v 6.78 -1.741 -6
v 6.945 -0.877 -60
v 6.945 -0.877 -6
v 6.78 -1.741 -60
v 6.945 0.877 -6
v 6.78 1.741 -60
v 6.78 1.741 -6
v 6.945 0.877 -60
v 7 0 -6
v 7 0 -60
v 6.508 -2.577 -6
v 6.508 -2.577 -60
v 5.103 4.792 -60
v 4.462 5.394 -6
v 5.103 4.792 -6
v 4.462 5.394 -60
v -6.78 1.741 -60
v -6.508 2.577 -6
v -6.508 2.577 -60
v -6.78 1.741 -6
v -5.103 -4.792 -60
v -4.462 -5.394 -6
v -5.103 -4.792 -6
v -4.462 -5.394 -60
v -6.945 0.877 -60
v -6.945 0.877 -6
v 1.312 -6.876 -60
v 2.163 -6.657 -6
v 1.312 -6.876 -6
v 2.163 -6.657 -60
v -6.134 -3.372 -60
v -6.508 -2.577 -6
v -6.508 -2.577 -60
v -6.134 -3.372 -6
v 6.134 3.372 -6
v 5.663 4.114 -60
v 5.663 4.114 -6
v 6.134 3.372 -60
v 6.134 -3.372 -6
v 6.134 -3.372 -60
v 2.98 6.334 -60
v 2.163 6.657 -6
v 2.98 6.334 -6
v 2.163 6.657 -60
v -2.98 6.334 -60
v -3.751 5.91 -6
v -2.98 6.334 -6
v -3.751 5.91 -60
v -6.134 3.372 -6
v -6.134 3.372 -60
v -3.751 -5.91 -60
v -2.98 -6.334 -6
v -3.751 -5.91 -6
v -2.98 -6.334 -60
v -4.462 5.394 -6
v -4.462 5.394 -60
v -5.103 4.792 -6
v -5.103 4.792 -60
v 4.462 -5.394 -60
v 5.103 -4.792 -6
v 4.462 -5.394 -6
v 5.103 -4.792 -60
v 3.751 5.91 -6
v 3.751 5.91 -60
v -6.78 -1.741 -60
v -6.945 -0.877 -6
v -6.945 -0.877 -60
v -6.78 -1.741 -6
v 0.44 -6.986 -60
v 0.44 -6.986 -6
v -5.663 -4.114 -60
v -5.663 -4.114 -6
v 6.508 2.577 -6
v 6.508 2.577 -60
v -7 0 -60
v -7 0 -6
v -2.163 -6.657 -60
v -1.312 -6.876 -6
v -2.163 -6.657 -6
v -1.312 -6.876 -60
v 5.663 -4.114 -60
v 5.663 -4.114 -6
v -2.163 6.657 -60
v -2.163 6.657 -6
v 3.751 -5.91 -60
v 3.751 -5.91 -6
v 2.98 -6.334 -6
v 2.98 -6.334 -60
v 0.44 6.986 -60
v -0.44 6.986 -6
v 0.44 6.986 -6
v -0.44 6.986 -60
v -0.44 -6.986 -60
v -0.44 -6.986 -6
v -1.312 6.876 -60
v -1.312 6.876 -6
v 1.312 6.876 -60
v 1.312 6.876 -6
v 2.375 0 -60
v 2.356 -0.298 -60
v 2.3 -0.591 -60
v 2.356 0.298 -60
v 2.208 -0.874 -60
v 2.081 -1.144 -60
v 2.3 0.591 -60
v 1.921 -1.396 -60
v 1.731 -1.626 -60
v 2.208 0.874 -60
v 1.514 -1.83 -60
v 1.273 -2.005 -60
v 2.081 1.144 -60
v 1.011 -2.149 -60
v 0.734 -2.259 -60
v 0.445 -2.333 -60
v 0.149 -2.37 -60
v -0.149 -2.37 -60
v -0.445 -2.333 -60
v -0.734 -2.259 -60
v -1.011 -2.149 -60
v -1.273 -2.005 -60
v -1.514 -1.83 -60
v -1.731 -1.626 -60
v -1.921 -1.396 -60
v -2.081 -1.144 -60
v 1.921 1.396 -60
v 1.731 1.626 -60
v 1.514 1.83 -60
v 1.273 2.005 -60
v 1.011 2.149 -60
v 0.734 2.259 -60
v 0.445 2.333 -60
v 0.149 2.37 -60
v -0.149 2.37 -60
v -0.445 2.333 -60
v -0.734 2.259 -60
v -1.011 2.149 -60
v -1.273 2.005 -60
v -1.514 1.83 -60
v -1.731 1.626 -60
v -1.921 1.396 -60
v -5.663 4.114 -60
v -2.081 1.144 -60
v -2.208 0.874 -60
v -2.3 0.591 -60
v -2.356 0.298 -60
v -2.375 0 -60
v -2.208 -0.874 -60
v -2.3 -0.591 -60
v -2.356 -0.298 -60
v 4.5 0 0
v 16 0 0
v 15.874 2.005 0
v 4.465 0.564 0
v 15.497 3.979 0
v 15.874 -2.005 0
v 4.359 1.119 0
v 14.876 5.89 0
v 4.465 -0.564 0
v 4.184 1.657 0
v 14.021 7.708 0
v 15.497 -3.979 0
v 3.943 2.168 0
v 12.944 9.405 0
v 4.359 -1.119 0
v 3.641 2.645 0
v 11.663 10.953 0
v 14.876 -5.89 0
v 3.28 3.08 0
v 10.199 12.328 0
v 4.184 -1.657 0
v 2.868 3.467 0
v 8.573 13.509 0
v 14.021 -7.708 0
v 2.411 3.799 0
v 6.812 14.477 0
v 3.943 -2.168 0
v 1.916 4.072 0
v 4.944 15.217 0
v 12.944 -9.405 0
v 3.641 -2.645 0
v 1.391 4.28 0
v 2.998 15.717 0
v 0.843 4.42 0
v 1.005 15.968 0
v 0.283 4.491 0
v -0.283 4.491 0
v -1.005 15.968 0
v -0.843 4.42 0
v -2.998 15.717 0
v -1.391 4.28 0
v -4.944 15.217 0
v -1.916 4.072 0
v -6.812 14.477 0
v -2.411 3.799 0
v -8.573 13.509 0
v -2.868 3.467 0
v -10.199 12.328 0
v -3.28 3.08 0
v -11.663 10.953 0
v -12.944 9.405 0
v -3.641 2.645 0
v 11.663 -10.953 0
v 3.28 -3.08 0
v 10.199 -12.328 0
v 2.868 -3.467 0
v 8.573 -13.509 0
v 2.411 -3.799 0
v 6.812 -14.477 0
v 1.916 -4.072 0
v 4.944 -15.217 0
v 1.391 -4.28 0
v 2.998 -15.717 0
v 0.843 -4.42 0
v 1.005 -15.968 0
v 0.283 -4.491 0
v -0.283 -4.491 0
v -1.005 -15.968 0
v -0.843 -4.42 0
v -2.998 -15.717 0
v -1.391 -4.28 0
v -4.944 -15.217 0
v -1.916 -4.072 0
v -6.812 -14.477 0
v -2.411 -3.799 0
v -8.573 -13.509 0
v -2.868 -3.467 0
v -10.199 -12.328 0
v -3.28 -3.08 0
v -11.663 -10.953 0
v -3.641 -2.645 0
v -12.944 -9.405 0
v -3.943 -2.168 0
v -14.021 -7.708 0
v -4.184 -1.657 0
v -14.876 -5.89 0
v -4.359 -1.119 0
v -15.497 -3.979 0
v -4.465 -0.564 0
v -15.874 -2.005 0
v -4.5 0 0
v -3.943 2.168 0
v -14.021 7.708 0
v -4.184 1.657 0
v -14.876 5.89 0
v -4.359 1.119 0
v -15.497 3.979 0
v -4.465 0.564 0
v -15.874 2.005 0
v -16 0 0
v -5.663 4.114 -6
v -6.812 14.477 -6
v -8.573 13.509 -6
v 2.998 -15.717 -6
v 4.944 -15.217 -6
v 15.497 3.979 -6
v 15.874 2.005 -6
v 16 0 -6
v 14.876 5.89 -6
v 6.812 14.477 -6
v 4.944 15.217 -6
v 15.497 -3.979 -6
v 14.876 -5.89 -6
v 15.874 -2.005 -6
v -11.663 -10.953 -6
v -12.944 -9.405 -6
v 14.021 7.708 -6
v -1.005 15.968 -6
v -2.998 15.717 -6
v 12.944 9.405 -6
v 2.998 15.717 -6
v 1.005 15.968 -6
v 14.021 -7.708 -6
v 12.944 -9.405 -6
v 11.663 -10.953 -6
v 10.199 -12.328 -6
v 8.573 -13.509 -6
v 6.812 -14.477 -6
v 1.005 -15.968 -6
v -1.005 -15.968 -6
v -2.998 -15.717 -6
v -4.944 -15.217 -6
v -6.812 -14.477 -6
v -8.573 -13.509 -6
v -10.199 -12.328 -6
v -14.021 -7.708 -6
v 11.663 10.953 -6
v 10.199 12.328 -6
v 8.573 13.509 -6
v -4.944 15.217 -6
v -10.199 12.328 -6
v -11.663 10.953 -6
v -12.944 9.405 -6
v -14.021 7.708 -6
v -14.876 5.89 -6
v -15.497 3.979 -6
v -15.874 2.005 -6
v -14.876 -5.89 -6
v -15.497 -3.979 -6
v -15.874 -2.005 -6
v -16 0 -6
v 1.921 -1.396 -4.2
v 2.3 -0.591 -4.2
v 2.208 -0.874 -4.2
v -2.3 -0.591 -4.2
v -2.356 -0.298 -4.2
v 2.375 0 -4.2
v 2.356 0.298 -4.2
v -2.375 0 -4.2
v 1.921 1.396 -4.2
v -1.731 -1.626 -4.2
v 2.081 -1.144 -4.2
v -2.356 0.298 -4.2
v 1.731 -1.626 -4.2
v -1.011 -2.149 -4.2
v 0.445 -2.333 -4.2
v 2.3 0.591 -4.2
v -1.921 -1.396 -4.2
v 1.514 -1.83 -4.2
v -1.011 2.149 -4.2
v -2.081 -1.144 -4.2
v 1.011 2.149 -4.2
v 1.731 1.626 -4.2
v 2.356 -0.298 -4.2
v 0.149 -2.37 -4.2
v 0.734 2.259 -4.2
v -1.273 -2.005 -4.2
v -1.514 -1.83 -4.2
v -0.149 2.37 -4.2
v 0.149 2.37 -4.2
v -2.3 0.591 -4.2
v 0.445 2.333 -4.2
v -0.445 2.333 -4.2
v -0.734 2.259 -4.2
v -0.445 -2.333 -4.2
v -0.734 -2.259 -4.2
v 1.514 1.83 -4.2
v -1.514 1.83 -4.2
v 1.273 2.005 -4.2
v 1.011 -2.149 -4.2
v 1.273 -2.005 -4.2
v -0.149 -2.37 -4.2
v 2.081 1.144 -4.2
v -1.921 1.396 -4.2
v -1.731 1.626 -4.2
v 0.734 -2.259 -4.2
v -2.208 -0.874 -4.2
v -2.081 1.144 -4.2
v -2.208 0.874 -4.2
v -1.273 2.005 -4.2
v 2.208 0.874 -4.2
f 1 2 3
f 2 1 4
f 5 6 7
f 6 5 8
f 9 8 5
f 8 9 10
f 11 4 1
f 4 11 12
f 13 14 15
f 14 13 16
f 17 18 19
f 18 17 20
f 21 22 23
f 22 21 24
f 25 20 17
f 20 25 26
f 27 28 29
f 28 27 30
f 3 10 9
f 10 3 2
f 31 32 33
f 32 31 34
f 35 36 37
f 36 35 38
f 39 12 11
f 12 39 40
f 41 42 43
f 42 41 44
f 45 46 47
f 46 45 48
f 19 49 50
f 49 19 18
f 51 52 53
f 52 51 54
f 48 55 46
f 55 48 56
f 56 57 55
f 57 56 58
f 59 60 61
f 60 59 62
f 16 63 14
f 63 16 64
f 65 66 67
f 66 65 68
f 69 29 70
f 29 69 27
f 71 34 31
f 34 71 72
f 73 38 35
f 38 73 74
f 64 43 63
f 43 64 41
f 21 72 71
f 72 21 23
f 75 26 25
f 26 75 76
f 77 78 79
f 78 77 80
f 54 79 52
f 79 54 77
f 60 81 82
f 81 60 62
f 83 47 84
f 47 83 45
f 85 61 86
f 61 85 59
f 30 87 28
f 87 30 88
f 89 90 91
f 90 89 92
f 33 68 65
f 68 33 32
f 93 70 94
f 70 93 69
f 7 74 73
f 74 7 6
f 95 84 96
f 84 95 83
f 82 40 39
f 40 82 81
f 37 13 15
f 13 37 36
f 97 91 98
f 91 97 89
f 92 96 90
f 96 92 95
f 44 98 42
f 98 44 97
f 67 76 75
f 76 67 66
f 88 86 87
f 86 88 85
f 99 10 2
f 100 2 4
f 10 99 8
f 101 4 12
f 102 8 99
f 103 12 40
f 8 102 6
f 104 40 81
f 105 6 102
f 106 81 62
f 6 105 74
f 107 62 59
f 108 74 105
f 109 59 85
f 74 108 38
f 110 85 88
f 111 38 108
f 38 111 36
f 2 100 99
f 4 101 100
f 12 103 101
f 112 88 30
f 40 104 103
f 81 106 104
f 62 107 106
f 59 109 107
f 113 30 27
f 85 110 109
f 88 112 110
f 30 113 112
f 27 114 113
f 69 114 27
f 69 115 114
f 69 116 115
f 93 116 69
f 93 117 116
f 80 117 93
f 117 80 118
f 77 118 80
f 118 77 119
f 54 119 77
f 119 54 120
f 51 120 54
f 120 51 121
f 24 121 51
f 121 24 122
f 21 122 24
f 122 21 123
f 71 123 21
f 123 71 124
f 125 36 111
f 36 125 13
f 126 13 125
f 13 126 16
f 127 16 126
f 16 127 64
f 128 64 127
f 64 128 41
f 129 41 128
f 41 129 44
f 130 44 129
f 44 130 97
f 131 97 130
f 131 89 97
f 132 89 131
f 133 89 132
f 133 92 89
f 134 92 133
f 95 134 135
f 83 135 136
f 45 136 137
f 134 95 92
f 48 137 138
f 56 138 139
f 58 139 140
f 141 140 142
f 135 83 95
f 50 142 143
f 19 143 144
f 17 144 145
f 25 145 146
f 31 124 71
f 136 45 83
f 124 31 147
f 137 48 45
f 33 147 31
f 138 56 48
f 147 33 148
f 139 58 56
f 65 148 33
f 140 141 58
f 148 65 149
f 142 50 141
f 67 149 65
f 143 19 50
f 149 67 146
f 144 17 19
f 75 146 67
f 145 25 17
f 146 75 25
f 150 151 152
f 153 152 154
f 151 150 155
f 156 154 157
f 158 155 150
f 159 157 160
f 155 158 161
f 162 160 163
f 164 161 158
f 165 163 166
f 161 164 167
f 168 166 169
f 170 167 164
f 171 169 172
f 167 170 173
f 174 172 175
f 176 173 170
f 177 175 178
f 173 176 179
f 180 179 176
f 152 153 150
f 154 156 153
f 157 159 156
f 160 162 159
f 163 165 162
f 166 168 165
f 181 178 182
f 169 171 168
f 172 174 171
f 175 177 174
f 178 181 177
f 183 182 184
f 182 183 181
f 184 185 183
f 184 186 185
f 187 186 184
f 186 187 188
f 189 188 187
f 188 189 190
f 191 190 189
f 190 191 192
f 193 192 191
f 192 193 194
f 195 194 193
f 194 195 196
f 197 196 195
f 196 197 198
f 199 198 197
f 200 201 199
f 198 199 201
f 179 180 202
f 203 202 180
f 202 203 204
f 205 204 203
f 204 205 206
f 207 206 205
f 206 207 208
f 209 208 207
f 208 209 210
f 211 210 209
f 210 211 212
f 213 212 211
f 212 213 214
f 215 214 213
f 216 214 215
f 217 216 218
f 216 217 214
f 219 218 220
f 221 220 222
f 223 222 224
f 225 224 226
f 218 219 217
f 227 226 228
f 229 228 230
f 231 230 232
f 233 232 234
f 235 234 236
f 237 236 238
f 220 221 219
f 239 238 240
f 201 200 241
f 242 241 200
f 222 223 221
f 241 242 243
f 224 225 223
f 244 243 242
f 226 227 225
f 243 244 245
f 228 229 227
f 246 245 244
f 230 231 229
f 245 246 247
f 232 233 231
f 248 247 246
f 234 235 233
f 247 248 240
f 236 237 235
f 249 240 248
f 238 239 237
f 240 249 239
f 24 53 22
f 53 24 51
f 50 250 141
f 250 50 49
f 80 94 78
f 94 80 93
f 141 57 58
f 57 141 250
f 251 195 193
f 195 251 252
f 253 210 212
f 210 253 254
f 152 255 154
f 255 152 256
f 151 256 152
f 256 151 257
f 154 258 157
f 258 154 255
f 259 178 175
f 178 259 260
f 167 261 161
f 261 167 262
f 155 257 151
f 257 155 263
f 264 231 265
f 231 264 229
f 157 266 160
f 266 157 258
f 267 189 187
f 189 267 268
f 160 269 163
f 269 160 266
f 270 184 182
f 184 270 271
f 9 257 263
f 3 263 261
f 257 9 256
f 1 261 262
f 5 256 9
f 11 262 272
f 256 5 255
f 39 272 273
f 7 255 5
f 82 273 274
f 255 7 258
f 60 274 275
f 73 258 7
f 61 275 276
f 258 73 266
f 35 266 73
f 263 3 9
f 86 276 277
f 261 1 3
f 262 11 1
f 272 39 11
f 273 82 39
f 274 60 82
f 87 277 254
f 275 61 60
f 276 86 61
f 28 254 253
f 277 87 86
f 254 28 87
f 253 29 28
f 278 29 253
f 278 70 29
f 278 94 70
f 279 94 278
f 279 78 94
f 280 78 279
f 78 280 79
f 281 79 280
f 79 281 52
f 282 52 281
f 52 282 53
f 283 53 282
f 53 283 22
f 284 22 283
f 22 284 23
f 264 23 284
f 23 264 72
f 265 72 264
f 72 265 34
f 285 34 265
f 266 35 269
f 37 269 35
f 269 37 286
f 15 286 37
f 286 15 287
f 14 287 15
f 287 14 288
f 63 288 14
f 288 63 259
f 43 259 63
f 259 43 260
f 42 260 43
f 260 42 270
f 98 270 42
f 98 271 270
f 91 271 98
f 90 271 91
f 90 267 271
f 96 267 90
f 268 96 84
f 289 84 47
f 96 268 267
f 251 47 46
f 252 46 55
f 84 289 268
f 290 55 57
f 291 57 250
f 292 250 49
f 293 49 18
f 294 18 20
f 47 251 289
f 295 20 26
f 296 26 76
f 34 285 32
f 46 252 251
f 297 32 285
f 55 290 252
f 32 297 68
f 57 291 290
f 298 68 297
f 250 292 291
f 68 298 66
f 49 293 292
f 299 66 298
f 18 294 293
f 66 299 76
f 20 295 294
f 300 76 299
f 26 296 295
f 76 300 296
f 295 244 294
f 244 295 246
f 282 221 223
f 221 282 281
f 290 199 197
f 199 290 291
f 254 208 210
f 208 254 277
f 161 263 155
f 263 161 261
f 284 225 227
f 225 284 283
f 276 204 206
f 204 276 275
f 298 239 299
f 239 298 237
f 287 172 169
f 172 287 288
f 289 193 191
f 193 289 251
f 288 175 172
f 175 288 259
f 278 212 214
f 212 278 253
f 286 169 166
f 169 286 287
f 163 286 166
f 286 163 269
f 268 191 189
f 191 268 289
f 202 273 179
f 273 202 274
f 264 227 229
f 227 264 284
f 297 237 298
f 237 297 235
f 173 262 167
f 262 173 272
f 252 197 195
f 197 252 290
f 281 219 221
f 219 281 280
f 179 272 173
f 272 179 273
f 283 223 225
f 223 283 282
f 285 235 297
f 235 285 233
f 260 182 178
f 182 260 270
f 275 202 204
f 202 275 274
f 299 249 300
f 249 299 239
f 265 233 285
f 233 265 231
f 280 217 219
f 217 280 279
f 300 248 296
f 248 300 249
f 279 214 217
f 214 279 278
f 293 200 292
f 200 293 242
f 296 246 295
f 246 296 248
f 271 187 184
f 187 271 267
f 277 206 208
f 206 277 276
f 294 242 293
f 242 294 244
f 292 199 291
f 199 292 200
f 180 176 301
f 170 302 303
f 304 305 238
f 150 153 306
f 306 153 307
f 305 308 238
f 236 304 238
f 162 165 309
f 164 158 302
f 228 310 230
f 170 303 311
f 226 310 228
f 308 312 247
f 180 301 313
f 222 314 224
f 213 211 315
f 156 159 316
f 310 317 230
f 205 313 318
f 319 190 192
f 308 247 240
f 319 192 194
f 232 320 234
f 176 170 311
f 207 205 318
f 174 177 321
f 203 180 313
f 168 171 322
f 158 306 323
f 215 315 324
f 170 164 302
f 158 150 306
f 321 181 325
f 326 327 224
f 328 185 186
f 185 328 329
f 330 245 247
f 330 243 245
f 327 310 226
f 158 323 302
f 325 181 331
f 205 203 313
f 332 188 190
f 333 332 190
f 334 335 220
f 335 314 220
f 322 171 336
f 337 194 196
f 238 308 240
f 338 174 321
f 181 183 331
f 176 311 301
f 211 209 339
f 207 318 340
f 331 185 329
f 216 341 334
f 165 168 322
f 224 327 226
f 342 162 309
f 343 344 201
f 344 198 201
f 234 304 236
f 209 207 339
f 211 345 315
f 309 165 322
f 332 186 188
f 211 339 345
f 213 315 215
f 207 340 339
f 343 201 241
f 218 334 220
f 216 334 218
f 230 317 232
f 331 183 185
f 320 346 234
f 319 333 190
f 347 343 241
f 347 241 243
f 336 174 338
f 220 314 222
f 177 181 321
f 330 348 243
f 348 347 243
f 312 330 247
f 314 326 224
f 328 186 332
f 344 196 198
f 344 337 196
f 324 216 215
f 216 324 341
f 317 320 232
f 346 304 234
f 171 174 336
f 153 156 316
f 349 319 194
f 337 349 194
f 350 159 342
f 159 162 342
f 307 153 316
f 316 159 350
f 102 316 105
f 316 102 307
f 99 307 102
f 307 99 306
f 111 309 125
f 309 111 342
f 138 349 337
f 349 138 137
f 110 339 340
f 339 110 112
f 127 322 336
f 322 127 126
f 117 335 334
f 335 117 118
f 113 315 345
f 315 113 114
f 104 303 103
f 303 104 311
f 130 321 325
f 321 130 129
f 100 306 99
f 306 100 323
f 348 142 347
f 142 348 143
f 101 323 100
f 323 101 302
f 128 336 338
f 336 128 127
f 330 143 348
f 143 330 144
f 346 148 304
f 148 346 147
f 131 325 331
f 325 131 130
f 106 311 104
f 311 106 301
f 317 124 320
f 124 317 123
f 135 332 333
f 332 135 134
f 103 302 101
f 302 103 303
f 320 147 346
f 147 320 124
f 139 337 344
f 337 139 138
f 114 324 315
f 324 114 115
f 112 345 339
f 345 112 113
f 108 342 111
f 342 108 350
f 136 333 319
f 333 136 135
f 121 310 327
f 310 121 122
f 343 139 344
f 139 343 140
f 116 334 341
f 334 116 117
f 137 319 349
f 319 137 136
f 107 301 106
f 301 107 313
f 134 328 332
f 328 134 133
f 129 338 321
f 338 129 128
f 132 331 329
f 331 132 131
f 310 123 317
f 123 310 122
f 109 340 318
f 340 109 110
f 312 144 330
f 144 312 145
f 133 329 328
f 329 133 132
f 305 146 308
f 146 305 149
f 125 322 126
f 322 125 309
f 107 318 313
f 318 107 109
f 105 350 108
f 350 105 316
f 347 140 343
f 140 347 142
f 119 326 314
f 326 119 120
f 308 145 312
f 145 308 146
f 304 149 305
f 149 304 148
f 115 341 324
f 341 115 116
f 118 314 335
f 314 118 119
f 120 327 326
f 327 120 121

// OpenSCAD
$fn = 50;


difference() {
	union() {
		translate(v = [0, 0, -60.0000000000]) {
			cylinder(h = 60, r = 7.0000000000);
		}
		translate(v = [0, 0, -6.0000000000]) {
			cylinder(h = 6, r = 16.0000000000);
		}
	}
	union() {
		translate(v = [0, 0, 0]) {
			rotate(a = [0, 0, 0]) {
				difference() {
					union() {
						#translate(v = [0, 0, -60.0000000000]) {
							cylinder(h = 60, r = 2.2500000000);
						}
						#translate(v = [0, 0, -4.2000000000]) {
							cylinder(h = 4.2000000000, r = 7.0000000000, r1 = 2.3750000000, r2 = 4.5000000000);
						}
						#translate(v = [0, 0, -60.0000000000]) {
							cylinder(h = 60, r = 2.3750000000);
						}
						#translate(v = [0, 0, -60.0000000000]) {
							cylinder(h = 60, r = 2.2500000000);
						}
					}
					union();
				}
			}
		}
	}
}
